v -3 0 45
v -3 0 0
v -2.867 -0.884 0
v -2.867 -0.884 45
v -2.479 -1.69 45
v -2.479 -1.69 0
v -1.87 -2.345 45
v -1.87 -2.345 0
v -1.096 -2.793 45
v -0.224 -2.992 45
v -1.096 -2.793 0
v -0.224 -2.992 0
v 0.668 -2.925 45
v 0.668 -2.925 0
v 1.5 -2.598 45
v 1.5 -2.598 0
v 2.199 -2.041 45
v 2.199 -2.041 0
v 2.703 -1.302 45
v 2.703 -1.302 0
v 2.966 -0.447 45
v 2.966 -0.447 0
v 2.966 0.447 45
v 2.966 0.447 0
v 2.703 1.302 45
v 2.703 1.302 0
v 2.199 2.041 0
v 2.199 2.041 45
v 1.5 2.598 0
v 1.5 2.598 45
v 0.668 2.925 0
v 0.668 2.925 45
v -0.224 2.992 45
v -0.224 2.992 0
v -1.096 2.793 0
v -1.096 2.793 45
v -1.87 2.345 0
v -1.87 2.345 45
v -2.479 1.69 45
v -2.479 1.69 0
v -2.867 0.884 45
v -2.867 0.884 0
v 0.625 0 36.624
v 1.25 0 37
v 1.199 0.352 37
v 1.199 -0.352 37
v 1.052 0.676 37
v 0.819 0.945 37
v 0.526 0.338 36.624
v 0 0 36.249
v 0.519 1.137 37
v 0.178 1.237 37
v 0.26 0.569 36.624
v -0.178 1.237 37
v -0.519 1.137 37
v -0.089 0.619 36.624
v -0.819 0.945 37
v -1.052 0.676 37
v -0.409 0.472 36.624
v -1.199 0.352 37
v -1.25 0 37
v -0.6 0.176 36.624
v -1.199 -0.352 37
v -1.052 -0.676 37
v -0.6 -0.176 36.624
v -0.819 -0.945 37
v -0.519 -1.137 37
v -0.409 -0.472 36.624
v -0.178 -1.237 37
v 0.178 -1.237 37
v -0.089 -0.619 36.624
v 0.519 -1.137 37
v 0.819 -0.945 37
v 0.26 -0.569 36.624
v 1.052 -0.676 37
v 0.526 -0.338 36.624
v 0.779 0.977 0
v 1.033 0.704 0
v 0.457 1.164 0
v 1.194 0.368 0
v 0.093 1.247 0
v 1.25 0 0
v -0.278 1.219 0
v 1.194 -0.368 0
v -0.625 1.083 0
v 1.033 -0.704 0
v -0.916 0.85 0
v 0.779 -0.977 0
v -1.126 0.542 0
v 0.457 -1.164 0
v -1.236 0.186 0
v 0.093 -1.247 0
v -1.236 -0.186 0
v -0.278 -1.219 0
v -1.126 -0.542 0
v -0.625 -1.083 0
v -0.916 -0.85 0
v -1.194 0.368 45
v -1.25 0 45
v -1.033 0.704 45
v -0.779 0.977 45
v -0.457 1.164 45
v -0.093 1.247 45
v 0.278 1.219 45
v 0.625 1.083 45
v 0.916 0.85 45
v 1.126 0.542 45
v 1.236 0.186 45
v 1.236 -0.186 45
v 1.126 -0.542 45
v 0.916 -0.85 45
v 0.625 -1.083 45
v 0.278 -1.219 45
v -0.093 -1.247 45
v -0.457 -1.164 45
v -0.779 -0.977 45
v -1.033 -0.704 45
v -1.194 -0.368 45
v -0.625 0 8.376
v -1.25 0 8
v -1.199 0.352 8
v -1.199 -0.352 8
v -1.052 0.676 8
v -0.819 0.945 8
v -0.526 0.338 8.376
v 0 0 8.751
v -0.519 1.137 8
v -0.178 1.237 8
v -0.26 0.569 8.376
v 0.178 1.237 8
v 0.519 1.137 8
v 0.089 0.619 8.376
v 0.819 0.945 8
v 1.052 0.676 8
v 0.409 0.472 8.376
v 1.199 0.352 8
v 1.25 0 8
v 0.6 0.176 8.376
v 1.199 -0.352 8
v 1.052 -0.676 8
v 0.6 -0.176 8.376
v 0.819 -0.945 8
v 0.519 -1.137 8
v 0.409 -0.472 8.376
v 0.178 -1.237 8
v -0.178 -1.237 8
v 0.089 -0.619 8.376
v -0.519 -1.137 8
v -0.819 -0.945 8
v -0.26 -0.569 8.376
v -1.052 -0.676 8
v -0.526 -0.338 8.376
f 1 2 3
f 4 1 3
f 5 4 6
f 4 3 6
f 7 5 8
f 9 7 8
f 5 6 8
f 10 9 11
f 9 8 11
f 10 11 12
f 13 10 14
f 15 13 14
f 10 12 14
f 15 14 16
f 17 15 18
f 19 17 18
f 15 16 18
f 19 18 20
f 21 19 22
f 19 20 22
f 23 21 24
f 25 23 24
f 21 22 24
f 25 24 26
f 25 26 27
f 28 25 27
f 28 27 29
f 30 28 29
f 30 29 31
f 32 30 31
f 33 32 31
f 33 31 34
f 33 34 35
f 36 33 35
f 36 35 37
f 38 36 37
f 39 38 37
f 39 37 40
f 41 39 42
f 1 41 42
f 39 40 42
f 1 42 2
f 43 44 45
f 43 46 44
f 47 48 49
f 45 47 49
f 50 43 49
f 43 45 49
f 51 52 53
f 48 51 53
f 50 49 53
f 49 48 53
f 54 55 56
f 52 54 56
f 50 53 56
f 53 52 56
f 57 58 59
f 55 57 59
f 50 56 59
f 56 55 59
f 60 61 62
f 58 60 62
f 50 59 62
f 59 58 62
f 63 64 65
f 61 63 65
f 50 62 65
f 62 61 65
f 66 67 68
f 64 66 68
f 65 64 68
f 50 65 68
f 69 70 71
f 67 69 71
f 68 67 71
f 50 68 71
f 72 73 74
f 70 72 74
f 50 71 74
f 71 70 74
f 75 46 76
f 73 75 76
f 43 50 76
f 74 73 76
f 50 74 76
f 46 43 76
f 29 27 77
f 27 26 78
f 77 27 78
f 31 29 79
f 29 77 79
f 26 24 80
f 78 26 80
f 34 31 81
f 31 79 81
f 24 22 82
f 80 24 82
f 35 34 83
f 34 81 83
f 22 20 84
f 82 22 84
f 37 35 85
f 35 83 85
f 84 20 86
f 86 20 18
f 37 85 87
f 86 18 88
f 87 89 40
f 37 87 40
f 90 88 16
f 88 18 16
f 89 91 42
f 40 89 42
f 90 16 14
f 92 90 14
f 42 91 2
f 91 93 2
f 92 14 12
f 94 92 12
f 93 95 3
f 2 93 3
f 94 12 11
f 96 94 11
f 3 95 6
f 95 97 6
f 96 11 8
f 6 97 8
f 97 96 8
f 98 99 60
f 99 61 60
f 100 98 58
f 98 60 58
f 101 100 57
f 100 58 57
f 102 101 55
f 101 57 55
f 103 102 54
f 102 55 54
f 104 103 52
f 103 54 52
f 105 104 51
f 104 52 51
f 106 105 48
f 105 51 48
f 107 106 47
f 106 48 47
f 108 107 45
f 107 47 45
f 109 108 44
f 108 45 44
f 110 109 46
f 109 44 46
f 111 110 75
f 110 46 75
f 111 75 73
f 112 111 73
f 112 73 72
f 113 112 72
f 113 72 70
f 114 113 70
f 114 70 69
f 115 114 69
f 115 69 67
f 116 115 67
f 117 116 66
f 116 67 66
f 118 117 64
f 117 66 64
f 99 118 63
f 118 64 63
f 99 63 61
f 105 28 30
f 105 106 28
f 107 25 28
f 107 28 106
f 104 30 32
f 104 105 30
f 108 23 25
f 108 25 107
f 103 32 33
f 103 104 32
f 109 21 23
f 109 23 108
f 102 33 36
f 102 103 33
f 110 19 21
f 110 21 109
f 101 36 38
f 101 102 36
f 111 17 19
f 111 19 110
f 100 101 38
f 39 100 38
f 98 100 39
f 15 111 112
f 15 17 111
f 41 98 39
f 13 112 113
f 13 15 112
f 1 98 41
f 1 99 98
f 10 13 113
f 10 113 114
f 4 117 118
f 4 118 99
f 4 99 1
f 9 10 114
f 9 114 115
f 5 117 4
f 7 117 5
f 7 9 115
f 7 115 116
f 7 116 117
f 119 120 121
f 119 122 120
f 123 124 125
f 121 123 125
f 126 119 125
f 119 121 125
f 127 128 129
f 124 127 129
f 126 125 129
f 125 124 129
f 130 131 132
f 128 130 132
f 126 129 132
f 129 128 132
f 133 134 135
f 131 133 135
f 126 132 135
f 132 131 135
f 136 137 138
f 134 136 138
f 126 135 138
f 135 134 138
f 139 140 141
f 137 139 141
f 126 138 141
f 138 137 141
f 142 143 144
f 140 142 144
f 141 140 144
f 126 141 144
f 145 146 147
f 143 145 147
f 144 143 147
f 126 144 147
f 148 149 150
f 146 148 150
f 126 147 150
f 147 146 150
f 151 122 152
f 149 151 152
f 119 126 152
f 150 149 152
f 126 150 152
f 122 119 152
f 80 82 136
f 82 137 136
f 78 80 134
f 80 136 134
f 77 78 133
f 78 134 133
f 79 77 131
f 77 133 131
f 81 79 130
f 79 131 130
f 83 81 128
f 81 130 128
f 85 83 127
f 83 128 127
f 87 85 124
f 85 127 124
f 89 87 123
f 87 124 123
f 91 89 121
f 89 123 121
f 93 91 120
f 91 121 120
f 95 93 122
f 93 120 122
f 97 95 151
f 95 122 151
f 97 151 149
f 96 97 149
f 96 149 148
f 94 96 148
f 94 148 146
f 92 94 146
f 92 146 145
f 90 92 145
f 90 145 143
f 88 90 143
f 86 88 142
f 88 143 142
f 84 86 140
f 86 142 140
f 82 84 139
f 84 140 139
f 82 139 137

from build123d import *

# Parameters (mm, degrees)
ESBO_O1_R                                   = 3
RESSALTO_EXTRUS_O1_DEPTH                    = 45
BROCA_DE_ROSQUEAR_PARA_TARRAXA_DE_M31_D     = 2.5
BROCA_DE_ROSQUEAR_PARA_TARRAXA_DE_M31_DEPTH = 8
BROCA_DE_ROSQUEAR_PARA_TARRAXA_DE_M31_TIP   = 0.751075774
BROCA_DE_ROSQUEAR_PARA_TARRAXA_DE_M32_D     = 2.5
BROCA_DE_ROSQUEAR_PARA_TARRAXA_DE_M32_DEPTH = 8
BROCA_DE_ROSQUEAR_PARA_TARRAXA_DE_M32_TIP   = 0.751075774


with BuildPart() as part:
    # Esboço1 → Ressalto-extrusão1 (new body)
    with BuildSketch(Plane.XY):
        with Locations(Location((0, 0, 0), (0, 0, 180))):
            Circle(ESBO_O1_R)
    extrude(amount=RESSALTO_EXTRUS_O1_DEPTH)

    # Broca de rosquear para tarraxa de M31
    with Locations(Plane.XY.offset(45)):
        with Locations((0, 0)):
            Hole(BROCA_DE_ROSQUEAR_PARA_TARRAXA_DE_M31_D / 2, depth=BROCA_DE_ROSQUEAR_PARA_TARRAXA_DE_M31_DEPTH)
            with Locations((0, 0, -(BROCA_DE_ROSQUEAR_PARA_TARRAXA_DE_M31_DEPTH + BROCA_DE_ROSQUEAR_PARA_TARRAXA_DE_M31_TIP / 2))):  # 118° drill point
                Cone(0, BROCA_DE_ROSQUEAR_PARA_TARRAXA_DE_M31_D / 2, BROCA_DE_ROSQUEAR_PARA_TARRAXA_DE_M31_TIP, mode=Mode.SUBTRACT)

    # Broca de rosquear para tarraxa de M32
    with Locations(Plane(origin=(0, 0, 0), x_dir=(-1, 0, 0), z_dir=(0, 0, -1))):
        with Locations((0, 0)):
            Hole(BROCA_DE_ROSQUEAR_PARA_TARRAXA_DE_M32_D / 2, depth=BROCA_DE_ROSQUEAR_PARA_TARRAXA_DE_M32_DEPTH)
            with Locations((0, 0, -(BROCA_DE_ROSQUEAR_PARA_TARRAXA_DE_M32_DEPTH + BROCA_DE_ROSQUEAR_PARA_TARRAXA_DE_M32_TIP / 2))):  # 118° drill point
                Cone(0, BROCA_DE_ROSQUEAR_PARA_TARRAXA_DE_M32_D / 2, BROCA_DE_ROSQUEAR_PARA_TARRAXA_DE_M32_TIP, mode=Mode.SUBTRACT)


solid = part.part
